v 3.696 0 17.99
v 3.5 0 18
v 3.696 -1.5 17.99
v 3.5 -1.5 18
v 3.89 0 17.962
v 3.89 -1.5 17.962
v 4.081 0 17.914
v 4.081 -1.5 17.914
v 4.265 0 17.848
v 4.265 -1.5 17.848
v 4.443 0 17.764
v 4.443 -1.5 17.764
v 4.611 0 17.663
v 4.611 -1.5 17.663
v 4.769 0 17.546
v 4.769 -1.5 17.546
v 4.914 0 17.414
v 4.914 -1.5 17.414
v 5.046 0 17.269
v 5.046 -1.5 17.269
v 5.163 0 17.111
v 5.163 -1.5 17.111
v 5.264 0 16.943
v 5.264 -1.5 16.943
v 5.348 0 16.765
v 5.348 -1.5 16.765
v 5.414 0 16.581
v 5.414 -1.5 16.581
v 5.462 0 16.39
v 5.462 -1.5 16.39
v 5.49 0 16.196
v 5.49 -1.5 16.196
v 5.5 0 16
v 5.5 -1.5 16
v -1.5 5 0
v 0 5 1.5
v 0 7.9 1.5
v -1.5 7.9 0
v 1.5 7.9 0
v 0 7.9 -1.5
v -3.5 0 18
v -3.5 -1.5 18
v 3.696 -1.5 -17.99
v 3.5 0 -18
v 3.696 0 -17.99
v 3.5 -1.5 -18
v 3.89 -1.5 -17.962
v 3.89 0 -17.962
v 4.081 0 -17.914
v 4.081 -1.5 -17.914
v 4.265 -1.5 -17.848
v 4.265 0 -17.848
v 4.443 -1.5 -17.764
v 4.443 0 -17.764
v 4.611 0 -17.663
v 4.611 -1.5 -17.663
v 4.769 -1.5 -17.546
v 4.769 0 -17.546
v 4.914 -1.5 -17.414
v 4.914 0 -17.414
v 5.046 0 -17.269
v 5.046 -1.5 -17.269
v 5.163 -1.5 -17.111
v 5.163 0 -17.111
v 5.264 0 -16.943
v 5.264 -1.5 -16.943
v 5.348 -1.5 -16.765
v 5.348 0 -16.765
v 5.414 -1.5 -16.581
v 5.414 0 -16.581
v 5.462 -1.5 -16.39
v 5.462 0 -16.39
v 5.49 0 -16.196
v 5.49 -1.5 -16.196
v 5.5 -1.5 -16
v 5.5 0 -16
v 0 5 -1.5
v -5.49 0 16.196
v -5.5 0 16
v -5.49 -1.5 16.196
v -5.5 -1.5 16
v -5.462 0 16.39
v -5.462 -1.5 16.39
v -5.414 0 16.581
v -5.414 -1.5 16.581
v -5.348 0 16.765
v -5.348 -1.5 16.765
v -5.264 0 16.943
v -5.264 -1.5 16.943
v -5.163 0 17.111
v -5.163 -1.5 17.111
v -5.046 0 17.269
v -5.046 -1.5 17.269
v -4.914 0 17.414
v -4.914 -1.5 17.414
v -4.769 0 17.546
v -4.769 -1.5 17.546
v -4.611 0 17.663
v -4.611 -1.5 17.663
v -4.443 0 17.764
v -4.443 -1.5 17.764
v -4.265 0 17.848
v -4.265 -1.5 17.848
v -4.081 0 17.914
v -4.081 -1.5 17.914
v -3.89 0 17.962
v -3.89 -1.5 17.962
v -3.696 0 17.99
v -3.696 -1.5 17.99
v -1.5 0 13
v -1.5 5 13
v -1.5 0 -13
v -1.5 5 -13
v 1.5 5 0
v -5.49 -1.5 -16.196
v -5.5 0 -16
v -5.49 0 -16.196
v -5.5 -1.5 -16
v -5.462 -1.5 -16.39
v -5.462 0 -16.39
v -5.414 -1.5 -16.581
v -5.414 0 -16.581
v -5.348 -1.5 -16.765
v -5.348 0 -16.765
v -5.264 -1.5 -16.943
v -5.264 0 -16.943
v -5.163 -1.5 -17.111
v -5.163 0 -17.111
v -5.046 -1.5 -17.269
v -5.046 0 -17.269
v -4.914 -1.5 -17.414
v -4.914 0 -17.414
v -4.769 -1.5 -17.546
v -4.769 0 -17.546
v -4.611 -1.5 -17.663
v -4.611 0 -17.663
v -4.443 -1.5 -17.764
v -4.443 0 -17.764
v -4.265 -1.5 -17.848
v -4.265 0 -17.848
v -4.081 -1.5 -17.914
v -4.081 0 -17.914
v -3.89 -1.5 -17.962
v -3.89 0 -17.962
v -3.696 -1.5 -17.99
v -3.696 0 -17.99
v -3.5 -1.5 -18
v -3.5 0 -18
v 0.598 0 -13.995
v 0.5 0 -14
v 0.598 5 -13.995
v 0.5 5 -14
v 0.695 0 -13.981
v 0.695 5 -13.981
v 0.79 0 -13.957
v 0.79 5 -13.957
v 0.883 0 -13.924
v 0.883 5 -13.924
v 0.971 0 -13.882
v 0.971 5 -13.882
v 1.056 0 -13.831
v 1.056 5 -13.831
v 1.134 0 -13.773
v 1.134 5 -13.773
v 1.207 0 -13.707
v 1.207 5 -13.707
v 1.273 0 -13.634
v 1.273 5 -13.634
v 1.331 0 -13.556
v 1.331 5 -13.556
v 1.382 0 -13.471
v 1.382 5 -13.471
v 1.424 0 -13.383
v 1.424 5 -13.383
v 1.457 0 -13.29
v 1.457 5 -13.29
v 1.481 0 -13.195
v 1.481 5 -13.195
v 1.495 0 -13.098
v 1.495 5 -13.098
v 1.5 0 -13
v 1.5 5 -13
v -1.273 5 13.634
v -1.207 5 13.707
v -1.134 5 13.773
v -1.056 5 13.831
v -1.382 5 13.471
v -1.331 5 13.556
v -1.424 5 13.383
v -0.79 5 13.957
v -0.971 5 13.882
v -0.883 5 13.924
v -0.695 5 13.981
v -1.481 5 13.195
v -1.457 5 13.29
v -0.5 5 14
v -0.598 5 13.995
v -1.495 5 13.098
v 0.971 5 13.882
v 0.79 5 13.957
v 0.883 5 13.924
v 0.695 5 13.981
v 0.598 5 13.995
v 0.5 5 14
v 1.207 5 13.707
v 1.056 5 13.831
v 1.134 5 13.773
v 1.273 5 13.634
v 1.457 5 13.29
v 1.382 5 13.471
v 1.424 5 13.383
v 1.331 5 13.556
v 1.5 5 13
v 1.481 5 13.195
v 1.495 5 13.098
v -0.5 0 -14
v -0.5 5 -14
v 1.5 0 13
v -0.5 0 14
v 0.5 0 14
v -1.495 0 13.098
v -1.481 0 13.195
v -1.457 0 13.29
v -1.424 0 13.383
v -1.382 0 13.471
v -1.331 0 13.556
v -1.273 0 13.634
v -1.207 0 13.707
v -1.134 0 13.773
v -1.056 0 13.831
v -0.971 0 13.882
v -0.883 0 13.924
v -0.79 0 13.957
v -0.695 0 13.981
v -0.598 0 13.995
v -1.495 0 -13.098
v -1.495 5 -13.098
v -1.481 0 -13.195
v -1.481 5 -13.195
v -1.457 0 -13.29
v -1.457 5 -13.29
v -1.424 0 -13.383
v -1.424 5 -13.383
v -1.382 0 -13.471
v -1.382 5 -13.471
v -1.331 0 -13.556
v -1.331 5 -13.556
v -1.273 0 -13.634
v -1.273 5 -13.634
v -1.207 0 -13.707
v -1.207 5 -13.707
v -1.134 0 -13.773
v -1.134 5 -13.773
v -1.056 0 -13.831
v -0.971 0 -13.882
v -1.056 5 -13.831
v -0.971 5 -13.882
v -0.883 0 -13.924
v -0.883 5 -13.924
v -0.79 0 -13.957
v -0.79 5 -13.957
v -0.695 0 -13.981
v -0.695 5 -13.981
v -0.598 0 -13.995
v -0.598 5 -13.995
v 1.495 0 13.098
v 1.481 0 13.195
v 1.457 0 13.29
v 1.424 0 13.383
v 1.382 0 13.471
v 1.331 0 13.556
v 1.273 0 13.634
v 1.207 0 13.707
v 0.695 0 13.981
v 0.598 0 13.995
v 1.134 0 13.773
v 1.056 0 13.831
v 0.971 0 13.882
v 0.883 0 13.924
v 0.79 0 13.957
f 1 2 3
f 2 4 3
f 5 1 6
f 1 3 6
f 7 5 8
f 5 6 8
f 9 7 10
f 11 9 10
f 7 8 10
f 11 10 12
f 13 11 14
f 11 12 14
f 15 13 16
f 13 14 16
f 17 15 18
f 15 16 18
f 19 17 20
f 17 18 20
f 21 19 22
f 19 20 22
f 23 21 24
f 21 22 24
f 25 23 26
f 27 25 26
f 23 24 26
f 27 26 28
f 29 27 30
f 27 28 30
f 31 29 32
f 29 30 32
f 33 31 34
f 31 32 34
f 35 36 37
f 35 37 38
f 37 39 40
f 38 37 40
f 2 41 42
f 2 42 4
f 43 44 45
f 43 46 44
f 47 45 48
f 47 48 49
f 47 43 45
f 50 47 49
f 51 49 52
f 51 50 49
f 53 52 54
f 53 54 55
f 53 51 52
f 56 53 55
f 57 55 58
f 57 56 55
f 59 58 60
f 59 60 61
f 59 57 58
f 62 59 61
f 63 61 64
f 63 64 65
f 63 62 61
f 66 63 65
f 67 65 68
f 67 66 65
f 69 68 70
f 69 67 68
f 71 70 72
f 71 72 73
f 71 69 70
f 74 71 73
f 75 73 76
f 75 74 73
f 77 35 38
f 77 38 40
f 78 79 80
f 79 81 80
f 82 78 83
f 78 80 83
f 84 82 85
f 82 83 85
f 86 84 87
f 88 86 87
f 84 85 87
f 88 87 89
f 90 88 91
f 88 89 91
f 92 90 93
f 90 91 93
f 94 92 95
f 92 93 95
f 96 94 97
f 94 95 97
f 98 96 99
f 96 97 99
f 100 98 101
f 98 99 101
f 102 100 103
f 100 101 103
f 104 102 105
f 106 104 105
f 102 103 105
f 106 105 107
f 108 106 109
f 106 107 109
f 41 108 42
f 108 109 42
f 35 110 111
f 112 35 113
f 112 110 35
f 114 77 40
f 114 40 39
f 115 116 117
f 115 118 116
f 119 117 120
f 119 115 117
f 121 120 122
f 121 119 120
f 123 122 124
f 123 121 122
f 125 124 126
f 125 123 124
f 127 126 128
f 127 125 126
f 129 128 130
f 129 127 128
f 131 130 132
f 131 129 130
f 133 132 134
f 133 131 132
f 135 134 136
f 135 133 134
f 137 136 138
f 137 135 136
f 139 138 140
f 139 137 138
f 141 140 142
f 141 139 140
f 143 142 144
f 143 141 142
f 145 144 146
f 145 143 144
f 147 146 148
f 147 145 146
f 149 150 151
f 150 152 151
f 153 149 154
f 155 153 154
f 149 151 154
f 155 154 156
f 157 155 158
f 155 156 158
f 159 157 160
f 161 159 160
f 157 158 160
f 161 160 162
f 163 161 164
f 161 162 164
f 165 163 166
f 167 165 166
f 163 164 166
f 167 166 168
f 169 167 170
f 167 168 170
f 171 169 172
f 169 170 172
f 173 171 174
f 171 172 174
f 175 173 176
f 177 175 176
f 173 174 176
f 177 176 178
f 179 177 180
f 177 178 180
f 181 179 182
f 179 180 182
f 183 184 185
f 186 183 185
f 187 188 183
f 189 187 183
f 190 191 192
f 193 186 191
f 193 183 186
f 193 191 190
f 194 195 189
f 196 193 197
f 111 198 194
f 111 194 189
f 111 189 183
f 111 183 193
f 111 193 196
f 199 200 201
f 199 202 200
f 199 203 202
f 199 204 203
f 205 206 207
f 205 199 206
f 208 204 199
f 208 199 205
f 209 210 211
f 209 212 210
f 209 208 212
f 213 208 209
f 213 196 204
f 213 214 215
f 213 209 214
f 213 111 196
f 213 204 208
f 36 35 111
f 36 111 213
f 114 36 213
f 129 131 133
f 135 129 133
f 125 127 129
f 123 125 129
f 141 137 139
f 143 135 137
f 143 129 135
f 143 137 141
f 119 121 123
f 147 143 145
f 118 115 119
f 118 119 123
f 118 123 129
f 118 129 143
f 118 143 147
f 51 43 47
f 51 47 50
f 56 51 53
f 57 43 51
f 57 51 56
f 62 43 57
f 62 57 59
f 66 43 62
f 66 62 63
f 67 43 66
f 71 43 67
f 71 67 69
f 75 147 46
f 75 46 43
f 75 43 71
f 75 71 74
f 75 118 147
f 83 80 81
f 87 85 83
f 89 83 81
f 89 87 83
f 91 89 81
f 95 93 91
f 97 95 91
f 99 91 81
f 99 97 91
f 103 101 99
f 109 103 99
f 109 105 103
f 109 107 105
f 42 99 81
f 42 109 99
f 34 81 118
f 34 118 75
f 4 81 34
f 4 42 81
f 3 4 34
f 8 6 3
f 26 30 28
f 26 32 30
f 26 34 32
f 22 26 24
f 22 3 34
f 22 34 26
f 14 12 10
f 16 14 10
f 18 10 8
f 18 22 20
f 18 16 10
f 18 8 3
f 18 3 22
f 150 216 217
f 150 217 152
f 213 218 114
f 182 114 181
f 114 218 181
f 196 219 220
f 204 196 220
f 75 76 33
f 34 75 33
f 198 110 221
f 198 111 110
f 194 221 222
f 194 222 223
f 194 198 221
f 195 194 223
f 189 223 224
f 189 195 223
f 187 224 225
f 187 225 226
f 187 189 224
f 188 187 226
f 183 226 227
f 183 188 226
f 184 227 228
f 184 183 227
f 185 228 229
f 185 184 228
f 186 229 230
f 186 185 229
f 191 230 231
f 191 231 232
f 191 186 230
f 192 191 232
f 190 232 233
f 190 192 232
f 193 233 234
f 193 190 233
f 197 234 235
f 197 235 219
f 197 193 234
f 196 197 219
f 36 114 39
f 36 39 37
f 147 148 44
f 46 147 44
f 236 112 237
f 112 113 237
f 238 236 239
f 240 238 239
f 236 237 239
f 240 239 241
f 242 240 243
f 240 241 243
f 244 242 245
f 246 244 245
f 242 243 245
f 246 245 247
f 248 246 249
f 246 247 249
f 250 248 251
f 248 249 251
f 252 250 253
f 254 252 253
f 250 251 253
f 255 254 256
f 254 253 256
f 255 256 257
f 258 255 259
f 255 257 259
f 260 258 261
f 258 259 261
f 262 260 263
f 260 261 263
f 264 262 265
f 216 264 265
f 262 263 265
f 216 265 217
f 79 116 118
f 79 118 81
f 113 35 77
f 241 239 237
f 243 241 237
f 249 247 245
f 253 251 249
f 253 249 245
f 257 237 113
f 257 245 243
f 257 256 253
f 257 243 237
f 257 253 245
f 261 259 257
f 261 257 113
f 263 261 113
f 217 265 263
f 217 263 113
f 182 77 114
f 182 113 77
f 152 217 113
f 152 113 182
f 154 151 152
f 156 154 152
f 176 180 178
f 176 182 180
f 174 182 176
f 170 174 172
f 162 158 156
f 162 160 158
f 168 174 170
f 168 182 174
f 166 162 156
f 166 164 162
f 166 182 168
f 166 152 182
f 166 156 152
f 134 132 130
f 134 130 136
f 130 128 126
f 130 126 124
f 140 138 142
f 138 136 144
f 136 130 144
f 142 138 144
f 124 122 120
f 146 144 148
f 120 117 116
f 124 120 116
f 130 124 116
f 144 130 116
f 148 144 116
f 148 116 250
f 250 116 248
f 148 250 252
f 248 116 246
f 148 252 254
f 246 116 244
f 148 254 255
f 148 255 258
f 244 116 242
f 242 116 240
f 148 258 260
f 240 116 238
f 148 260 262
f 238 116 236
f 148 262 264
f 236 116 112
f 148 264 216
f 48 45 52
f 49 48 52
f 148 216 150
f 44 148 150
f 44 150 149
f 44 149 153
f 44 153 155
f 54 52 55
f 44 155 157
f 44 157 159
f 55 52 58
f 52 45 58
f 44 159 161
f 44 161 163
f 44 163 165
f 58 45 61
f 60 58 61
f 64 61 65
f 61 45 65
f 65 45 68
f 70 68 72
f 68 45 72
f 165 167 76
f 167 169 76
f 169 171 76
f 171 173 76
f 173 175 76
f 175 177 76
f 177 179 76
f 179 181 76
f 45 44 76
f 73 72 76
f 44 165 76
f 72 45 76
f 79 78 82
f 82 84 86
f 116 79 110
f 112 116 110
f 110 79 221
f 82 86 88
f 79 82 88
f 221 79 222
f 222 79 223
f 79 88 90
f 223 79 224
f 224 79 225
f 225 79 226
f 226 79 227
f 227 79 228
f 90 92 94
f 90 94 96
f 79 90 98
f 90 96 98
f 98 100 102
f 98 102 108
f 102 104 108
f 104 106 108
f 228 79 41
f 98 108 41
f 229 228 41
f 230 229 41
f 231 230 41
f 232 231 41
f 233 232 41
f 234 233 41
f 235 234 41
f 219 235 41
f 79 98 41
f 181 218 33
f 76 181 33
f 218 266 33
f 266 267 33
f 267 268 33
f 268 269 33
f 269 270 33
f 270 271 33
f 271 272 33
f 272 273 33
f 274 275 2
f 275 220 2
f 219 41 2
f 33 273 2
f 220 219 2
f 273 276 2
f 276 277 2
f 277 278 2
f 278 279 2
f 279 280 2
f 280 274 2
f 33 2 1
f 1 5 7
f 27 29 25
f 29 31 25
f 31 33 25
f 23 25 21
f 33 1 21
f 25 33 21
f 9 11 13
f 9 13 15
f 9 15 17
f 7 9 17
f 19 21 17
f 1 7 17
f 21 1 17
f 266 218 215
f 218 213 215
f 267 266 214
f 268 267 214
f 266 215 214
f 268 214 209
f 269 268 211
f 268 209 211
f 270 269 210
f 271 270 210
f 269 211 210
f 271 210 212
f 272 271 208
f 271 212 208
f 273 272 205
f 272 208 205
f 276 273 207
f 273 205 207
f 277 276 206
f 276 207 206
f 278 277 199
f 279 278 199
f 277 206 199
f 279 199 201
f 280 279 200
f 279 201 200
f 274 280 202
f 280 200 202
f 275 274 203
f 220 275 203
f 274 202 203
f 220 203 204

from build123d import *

# Parameters (mm, degrees)
SKETCH_1_W      = 3
SKETCH_1_H      = 28
EXTRUDE_1_DEPTH = 5
SKETCH_2_W      = 11
SKETCH_2_H      = 36
EXTRUDE_2_DEPTH = 1.5
FILLET_1_R      = 1
FILLET_3_R      = 2
EXTRUDE_3_DEPTH = 2.9


with BuildPart() as part:
    # Эскиз1 → Бобышка-Вытянуть1 (new body)
    with BuildSketch(Plane(origin=(0, 0, 0), x_dir=(1, 0, 0), z_dir=(0, 1, 0))):
        Rectangle(SKETCH_1_W, SKETCH_1_H)
    extrude(amount=EXTRUDE_1_DEPTH)

    # Эскиз2 → Бобышка-Вытянуть2 (add)
    with BuildSketch(Plane.XZ):
        Rectangle(SKETCH_2_W, SKETCH_2_H)
    extrude(amount=EXTRUDE_2_DEPTH)

    # Скругление1
    fillet_1_edges = [part.edges().sort_by_distance(p)[0] for p in [
        (-1.5, 2.5, -14),
        (1.5, 2.5, -14),
        (1.5, 2.5, 14),
        (-1.5, 2.5, 14),
    ]]
    fillet(fillet_1_edges, radius=FILLET_1_R)

    # Скругление3
    fillet_3_edges = [part.edges().sort_by_distance(p)[0] for p in [
        (5.5, -0.75, -18),
        (5.5, -0.75, 18),
        (-5.5, -0.75, 18),
        (-5.5, -0.75, -18),
    ]]
    fillet(fillet_3_edges, radius=FILLET_3_R)

    # Эскиз3 → Бобышка-Вытянуть3 (add)
    with BuildSketch(Plane(origin=(0, 5, 0), x_dir=(1, 0, 0), z_dir=(0, 1, 0))):
        Polygon((-1.5, 0), (0, 1.5), (1.5, 0), (0, -1.5), align=None)
    extrude(amount=EXTRUDE_3_DEPTH)


solid = part.part
